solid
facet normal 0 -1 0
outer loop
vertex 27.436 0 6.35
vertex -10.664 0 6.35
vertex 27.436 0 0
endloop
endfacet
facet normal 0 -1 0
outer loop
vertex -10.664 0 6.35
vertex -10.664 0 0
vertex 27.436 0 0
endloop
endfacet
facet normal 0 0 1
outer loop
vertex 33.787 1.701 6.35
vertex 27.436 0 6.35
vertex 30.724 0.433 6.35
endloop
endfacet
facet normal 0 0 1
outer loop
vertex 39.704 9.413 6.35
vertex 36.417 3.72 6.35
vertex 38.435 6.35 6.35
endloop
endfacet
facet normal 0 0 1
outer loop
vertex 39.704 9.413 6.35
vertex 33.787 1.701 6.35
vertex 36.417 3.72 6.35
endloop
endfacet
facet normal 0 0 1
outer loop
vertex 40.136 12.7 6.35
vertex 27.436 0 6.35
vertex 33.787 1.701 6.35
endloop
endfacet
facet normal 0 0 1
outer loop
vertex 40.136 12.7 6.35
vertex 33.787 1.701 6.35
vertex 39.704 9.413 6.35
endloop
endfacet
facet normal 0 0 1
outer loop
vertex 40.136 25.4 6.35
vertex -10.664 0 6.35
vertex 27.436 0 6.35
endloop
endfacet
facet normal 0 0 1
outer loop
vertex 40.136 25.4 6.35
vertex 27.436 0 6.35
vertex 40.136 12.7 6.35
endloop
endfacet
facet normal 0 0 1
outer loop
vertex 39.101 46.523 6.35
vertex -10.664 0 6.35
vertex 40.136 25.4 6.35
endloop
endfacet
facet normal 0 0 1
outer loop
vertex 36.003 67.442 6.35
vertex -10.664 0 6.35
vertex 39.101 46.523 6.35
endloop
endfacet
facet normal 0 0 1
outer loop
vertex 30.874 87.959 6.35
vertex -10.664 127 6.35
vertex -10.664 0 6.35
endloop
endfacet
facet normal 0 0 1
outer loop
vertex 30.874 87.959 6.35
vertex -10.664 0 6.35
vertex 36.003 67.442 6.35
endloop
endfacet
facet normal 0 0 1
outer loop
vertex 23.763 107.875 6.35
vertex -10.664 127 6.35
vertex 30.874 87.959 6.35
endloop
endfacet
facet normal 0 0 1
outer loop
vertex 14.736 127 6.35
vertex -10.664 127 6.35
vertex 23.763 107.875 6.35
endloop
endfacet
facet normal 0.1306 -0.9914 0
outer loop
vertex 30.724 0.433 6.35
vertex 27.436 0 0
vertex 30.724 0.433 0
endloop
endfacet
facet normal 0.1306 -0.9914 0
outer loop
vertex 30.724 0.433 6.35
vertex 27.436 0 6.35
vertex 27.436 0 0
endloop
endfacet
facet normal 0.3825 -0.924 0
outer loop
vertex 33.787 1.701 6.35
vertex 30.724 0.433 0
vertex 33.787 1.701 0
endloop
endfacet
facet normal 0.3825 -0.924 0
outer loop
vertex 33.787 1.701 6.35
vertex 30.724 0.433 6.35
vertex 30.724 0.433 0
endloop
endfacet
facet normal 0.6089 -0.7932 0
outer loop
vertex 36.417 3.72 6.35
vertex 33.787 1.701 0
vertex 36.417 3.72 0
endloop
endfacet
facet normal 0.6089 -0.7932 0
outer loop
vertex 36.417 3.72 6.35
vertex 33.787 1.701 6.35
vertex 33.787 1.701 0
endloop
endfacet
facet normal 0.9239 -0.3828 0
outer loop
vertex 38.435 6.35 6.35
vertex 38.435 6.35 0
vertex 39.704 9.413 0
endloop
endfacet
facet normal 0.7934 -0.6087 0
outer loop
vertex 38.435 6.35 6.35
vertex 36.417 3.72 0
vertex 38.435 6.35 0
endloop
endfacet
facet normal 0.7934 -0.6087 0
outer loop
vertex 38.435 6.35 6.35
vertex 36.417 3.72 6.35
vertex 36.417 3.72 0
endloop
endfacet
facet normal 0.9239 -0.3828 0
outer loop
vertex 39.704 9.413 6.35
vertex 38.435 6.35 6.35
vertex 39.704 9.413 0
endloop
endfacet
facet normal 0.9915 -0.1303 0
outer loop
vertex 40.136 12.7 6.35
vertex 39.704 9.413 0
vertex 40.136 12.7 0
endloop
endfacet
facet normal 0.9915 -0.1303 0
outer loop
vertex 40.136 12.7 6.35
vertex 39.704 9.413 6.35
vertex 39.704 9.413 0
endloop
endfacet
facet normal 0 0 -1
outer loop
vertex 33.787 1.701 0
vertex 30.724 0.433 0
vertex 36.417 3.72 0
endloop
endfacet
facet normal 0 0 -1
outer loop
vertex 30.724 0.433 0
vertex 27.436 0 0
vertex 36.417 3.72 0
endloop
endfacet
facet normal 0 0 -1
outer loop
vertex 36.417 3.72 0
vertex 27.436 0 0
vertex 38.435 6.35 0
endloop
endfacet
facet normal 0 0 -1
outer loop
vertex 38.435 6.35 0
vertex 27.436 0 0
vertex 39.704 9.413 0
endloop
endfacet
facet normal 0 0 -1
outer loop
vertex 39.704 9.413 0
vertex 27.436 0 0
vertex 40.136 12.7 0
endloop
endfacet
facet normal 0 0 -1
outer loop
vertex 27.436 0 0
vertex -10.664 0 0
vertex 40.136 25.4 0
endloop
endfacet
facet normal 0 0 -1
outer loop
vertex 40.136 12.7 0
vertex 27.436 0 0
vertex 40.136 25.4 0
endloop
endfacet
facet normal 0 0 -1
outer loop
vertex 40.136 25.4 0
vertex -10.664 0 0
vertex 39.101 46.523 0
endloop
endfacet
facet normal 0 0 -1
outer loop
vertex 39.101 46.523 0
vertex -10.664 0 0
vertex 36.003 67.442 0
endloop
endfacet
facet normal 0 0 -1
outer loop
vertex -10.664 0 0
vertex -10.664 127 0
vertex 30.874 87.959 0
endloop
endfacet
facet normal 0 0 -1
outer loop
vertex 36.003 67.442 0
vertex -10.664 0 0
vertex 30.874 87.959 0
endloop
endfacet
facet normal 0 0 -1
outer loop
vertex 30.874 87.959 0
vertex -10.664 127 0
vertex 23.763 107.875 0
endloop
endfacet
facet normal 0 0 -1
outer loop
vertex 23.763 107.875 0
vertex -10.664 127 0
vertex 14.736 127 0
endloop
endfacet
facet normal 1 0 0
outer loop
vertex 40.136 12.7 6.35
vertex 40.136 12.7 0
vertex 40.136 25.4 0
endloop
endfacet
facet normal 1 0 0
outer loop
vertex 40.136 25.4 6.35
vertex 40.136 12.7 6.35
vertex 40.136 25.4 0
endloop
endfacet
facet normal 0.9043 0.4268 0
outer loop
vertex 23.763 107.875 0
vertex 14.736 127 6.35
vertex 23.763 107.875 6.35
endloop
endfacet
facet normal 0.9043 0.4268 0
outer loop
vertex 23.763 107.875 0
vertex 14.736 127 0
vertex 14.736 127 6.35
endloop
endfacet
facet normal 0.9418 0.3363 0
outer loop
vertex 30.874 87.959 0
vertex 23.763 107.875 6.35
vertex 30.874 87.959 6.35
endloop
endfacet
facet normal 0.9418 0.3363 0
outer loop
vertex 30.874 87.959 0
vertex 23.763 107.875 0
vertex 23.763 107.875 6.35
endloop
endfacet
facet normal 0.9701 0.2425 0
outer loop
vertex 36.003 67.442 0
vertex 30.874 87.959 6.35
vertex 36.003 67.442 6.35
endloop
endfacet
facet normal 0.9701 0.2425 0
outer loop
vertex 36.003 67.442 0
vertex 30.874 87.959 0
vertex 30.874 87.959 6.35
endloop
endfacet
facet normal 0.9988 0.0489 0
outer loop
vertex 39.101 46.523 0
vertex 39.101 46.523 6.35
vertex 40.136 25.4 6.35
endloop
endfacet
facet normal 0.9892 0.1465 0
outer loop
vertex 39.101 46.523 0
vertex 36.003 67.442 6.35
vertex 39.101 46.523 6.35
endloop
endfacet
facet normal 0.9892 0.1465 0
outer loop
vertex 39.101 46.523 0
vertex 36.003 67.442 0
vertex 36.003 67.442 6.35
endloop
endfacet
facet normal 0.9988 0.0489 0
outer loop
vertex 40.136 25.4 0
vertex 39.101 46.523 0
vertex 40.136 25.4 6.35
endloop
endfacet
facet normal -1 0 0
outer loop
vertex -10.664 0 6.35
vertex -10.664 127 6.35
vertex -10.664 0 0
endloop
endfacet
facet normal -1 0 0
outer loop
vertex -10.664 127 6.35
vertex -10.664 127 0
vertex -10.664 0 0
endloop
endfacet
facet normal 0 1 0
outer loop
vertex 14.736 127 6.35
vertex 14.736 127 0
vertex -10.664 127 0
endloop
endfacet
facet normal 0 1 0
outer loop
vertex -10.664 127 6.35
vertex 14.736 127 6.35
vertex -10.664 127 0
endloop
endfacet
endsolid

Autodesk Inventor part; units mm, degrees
ref_plane "YZ Plane" through (0, 0, 0) normal (1, 0, 0) x (0, 1, 0)
ref_plane "XZ Plane" through (0, 0, 0) normal (0, 1, 0) x (-1, 0, 0)
ref_plane "XY Plane" through (0, 0, 0) normal (0, 0, 1) x (1, 0, 0)
sketch "Sketch1" plane through (0, 0, 0) normal (0, 0, 1) x (1, 0, 0)
  line L0 (-10.6635, 0) -> (40.1365, 0)
  line L1 (40.1365, 0) -> (40.1365, 127)
  line L2 (14.7365, 127) -> (-10.6635, 127)
  line L3 (-10.6635, 127) -> (-10.6635, 0)
  line L4 (40.1365, 0) -> (40.1365, 25.4)
  arc A0 (40.1365, 25.4) -> (14.7365, 127) centre (-175.7635, 25.4) ccw
  point P0 (0, 0)
  dimension "d0" = 50.8
  dimension "d1" = 127
  dimension "d2" = 25.4
extrude "Extrusion1" add sketch "Sketch1" along normal blind 6.35
fillet "Fillet1" radius 12.7 1 edges at (40.1365, 0, 3.175)
properties part number "Zachs wing"
